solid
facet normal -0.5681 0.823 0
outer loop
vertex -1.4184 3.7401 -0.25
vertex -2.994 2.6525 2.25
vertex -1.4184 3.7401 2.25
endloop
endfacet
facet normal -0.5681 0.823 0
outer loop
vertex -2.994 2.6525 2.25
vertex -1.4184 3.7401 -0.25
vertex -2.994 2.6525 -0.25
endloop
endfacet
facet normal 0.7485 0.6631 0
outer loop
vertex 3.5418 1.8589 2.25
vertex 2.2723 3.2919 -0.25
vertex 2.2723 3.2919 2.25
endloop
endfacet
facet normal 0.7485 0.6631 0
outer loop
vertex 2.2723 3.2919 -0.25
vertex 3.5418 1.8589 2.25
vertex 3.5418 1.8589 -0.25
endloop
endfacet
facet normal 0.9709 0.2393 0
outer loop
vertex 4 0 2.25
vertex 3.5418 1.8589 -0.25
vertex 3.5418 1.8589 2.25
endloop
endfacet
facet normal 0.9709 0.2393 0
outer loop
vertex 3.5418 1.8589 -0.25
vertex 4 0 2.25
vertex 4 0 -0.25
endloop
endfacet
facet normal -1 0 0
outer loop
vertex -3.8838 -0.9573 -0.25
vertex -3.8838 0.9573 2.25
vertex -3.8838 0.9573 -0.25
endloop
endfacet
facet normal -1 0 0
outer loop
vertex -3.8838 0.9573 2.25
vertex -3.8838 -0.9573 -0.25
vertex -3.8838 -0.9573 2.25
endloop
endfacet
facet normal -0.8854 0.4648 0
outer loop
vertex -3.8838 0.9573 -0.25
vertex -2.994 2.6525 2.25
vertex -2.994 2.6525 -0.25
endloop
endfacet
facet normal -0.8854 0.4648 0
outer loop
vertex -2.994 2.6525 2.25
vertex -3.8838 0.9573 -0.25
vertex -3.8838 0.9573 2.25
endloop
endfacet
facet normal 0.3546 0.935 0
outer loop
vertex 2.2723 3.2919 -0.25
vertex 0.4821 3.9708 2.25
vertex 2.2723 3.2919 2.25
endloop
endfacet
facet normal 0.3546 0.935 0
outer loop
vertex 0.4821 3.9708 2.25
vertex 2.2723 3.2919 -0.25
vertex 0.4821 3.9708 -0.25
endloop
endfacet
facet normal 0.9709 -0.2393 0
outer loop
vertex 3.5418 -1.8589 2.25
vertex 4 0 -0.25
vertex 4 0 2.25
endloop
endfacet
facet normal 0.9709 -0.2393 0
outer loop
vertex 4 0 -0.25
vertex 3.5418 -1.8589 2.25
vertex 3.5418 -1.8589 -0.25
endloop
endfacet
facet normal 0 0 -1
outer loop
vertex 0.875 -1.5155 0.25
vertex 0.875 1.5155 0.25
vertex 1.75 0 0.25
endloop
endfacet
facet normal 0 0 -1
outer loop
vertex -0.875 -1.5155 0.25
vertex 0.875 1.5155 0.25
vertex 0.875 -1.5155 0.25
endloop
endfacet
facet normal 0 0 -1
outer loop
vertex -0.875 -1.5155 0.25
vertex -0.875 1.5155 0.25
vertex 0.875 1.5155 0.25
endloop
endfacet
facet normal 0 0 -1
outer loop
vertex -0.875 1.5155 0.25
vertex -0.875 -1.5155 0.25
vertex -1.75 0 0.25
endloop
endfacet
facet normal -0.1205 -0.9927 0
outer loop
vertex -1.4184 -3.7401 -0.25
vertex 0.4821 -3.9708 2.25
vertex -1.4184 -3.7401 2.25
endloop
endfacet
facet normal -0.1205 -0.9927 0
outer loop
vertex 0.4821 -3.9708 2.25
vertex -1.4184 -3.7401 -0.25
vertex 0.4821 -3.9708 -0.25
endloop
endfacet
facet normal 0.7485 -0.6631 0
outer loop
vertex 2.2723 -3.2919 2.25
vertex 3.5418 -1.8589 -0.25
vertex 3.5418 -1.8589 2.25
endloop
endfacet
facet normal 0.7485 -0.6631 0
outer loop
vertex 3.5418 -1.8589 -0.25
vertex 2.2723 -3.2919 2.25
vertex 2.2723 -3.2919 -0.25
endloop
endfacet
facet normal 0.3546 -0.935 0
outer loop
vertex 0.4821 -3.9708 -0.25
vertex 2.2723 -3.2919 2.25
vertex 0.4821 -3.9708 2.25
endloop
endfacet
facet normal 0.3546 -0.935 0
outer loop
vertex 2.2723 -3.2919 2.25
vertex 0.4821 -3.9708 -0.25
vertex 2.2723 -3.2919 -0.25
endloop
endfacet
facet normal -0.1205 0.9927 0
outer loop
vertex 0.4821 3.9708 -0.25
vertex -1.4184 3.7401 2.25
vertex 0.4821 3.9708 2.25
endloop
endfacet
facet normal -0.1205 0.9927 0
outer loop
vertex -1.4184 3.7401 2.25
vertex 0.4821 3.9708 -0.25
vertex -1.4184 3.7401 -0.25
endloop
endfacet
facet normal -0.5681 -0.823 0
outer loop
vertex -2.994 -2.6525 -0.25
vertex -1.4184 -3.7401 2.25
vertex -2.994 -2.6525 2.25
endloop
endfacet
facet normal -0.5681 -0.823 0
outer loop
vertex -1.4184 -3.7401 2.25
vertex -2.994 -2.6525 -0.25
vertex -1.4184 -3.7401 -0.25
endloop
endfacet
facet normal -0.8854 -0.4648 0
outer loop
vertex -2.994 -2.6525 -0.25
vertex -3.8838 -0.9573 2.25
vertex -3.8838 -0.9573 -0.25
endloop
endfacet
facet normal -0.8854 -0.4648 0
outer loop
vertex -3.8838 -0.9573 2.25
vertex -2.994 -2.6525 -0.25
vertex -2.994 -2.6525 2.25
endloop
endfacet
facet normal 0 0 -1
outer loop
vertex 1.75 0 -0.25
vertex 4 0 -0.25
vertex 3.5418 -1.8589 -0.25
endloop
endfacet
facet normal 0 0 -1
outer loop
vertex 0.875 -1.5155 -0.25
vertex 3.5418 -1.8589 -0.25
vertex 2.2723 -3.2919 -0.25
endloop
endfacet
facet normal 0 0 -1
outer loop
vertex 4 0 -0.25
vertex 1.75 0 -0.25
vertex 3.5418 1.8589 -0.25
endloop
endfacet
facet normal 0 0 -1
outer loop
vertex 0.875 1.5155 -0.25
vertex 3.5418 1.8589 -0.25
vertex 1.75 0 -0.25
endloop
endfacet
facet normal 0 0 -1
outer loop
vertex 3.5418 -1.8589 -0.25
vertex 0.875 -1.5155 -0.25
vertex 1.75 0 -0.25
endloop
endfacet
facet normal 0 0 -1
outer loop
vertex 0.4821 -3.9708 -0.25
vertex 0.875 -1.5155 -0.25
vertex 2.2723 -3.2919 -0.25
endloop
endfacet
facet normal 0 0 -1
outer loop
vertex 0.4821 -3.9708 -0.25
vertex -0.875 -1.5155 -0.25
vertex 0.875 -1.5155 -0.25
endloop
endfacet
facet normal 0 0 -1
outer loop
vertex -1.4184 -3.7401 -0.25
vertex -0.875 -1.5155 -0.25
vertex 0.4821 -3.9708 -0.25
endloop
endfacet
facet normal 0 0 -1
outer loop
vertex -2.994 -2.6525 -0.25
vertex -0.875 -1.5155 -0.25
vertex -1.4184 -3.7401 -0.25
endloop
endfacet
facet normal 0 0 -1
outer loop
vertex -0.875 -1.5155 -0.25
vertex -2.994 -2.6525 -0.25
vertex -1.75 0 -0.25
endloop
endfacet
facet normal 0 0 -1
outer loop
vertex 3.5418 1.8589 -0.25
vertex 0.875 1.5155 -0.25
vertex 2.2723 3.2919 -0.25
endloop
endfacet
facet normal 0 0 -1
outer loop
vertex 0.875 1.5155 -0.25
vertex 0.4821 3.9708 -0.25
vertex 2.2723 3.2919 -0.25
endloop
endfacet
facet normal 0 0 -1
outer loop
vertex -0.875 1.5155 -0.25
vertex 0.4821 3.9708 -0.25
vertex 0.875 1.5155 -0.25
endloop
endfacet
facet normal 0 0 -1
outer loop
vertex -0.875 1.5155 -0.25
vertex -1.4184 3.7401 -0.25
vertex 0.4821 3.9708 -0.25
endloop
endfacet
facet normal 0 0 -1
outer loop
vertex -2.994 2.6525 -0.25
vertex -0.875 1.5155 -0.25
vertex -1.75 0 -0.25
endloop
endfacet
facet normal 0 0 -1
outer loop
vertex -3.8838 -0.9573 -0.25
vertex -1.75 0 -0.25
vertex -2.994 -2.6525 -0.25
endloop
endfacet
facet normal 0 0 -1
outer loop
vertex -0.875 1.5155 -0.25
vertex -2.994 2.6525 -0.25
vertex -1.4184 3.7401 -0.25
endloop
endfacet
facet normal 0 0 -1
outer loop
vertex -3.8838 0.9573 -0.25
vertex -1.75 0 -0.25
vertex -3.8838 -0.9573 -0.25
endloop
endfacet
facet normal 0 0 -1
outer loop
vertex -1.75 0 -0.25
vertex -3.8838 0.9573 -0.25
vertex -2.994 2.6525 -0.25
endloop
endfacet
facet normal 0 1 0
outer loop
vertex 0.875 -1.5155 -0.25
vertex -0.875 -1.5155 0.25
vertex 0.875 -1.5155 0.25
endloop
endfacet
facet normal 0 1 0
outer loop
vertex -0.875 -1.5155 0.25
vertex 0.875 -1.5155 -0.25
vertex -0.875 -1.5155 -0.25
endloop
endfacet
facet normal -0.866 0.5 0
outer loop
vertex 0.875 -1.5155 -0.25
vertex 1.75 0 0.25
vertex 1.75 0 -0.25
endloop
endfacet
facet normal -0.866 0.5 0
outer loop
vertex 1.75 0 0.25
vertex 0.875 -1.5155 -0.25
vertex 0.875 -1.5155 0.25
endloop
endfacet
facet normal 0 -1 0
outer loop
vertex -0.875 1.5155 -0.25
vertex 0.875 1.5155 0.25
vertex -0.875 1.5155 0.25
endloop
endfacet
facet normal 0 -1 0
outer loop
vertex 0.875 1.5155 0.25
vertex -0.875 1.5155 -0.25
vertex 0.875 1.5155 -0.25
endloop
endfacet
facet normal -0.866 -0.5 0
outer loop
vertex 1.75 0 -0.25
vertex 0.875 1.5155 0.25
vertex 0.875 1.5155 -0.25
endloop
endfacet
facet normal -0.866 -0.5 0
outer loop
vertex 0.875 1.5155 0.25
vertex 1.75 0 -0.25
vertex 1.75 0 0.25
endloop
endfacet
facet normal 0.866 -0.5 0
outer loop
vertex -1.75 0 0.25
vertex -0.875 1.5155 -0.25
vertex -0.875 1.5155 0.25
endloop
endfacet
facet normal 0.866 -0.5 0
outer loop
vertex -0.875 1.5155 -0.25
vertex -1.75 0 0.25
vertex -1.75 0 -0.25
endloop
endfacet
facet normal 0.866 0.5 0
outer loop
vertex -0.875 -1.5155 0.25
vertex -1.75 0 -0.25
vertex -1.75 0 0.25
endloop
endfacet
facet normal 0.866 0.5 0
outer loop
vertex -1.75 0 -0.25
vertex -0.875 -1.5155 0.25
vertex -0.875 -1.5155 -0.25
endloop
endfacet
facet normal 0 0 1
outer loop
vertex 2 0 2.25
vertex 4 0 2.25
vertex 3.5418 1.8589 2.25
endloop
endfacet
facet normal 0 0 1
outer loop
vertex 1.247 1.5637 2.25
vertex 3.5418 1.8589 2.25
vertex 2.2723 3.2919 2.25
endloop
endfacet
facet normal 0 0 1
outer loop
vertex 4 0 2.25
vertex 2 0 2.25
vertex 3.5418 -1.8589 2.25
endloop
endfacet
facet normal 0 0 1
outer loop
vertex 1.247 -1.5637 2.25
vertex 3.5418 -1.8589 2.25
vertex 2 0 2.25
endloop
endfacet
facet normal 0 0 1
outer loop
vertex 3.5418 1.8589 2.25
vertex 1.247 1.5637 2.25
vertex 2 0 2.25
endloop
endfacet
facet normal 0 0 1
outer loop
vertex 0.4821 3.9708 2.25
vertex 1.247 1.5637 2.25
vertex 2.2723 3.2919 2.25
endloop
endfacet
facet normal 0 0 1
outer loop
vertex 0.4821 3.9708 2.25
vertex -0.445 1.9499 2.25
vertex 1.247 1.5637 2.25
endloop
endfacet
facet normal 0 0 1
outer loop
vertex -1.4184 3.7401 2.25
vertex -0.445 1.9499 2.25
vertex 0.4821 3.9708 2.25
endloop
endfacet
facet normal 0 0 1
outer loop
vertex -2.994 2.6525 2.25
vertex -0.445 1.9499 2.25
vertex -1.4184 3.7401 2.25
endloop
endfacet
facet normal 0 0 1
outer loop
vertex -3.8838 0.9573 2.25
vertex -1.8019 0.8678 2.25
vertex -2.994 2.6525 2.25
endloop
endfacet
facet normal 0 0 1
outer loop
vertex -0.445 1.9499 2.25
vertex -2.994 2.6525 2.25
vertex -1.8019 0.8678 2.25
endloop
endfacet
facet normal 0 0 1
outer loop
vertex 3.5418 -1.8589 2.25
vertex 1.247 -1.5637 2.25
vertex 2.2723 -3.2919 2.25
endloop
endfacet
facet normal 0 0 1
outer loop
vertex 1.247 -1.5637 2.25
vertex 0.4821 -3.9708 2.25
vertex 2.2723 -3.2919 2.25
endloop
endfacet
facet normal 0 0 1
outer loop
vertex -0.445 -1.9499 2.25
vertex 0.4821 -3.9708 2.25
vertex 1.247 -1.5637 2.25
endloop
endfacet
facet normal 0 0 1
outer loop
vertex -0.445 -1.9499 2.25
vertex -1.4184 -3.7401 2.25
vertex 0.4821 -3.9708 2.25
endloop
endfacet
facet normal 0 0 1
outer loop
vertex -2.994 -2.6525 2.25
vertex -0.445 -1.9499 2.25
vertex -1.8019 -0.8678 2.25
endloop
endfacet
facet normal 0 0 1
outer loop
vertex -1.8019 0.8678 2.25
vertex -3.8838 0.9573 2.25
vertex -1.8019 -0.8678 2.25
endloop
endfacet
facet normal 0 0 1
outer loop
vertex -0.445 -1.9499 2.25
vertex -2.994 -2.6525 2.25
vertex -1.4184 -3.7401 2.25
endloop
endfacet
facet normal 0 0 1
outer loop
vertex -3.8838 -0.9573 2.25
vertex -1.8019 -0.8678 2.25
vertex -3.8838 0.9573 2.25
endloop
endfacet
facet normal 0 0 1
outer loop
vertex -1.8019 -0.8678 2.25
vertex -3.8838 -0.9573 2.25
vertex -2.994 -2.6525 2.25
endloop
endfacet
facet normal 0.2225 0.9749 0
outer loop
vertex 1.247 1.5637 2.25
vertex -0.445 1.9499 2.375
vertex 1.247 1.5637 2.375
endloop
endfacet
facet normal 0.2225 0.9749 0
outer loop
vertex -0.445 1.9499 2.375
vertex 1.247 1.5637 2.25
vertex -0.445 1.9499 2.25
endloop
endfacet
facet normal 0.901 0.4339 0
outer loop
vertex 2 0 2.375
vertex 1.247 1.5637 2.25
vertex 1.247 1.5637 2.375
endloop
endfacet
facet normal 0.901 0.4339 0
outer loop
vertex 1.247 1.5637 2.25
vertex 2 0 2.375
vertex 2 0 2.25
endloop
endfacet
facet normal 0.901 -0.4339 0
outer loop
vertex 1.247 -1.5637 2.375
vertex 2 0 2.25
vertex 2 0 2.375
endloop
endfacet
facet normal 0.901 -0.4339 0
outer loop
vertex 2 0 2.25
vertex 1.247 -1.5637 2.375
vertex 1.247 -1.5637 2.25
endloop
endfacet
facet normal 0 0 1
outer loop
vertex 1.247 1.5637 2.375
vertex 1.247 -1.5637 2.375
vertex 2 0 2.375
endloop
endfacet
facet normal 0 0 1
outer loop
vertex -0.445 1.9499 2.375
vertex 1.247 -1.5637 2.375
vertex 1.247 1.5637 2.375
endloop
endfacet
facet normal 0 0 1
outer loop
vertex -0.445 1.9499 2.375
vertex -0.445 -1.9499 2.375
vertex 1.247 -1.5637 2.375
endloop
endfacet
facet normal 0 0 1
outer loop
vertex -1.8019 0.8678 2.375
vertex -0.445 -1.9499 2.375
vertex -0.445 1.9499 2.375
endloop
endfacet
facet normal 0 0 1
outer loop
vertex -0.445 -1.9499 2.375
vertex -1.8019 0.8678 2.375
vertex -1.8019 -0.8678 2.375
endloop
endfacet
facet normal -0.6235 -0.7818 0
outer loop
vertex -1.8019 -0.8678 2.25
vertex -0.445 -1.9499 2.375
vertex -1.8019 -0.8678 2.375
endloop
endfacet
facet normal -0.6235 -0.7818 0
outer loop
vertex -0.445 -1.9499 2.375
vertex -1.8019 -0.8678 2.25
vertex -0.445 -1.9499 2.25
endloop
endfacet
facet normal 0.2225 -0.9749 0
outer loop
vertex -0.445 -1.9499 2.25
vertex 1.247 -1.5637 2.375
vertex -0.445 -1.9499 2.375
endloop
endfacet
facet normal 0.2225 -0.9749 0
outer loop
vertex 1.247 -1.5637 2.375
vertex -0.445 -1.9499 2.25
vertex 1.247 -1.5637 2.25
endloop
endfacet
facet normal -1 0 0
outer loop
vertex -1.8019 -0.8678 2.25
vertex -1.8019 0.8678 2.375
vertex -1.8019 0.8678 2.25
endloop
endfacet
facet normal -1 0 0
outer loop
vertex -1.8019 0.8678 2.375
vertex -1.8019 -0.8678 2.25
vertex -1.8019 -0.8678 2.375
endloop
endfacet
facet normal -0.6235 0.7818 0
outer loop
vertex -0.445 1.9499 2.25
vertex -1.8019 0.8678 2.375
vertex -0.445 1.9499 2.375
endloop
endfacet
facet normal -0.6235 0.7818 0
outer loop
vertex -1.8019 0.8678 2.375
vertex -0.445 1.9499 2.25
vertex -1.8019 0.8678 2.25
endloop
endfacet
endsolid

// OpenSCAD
// Parameters
inner_diameter_mm = 3.5; //[1.75:7:0.05]
outer_diameter_mm = 8; //[4:16:0.1]
thickness_mm = 0.5; //[0.25:1:0.05]
eps_mm = 0.2; //[0.05:0.5:0.05]

// Derived parameters
inner_radius_mm = inner_diameter_mm / 2; //[0.875:3.5:0.025]
outer_radius_mm = outer_diameter_mm / 2; //[2:8:0.05]

// Washer geometry
module washer() {
  difference() {
    cylinder(r=outer_radius_mm, h=thickness_mm, center=true);
    cylinder(r=inner_radius_mm, h=thickness_mm + 2 * eps_mm, center=true);
  }
}

// Round Grommet Top - Custom geometry
module round_grommet_top() {
  color("Silver") {
    translate([0, 0, thickness_mm]) {
      cylinder(r=outer_radius_mm, h=thickness_mm, center=true);
      translate([0, 0, thickness_mm / 2]) {
        cylinder(r=outer_radius_mm * 0.8, h=thickness_mm / 2, center=true);
      }
    }
  }
}

// Round Grommet Assembly - Custom geometry
module round_grommet_assembly() {
  color("DimGray") {
    translate([0, 0, 2 * thickness_mm]) {
      cylinder(r=outer_radius_mm, h=thickness_mm, center=true);
      translate([0, 0, thickness_mm / 2]) {
        cylinder(r=outer_radius_mm * 0.7, h=thickness_mm / 2, center=true);
      }
    }
  }
}

// Nut And Washer - Custom geometry
module nut_and_washer() {
  color("Black") {
    translate([0, 0, 3 * thickness_mm]) {
      cylinder(r=outer_radius_mm, h=thickness_mm, center=true);
      translate([0, 0, thickness_mm / 2]) {
        cylinder(r=outer_radius_mm * 0.6, h=thickness_mm / 2, center=true);
      }
    }
  }
}

// Screw And Washer - Custom geometry
module screw_and_washer() {
  color("Silver") {
    translate([0, 0, 4 * thickness_mm]) {
      cylinder(r=outer_radius_mm, h=thickness_mm, center=true);
      translate([0, 0, thickness_mm / 2]) {
        cylinder(r=outer_radius_mm * 0.5, h=thickness_mm / 2, center=true);
      }
    }
  }
}

// Assembly
module assembly() {
  washer();
  round_grommet_top();
  round_grommet_assembly();
  nut_and_washer();
  screw_and_washer();
}

assembly();
